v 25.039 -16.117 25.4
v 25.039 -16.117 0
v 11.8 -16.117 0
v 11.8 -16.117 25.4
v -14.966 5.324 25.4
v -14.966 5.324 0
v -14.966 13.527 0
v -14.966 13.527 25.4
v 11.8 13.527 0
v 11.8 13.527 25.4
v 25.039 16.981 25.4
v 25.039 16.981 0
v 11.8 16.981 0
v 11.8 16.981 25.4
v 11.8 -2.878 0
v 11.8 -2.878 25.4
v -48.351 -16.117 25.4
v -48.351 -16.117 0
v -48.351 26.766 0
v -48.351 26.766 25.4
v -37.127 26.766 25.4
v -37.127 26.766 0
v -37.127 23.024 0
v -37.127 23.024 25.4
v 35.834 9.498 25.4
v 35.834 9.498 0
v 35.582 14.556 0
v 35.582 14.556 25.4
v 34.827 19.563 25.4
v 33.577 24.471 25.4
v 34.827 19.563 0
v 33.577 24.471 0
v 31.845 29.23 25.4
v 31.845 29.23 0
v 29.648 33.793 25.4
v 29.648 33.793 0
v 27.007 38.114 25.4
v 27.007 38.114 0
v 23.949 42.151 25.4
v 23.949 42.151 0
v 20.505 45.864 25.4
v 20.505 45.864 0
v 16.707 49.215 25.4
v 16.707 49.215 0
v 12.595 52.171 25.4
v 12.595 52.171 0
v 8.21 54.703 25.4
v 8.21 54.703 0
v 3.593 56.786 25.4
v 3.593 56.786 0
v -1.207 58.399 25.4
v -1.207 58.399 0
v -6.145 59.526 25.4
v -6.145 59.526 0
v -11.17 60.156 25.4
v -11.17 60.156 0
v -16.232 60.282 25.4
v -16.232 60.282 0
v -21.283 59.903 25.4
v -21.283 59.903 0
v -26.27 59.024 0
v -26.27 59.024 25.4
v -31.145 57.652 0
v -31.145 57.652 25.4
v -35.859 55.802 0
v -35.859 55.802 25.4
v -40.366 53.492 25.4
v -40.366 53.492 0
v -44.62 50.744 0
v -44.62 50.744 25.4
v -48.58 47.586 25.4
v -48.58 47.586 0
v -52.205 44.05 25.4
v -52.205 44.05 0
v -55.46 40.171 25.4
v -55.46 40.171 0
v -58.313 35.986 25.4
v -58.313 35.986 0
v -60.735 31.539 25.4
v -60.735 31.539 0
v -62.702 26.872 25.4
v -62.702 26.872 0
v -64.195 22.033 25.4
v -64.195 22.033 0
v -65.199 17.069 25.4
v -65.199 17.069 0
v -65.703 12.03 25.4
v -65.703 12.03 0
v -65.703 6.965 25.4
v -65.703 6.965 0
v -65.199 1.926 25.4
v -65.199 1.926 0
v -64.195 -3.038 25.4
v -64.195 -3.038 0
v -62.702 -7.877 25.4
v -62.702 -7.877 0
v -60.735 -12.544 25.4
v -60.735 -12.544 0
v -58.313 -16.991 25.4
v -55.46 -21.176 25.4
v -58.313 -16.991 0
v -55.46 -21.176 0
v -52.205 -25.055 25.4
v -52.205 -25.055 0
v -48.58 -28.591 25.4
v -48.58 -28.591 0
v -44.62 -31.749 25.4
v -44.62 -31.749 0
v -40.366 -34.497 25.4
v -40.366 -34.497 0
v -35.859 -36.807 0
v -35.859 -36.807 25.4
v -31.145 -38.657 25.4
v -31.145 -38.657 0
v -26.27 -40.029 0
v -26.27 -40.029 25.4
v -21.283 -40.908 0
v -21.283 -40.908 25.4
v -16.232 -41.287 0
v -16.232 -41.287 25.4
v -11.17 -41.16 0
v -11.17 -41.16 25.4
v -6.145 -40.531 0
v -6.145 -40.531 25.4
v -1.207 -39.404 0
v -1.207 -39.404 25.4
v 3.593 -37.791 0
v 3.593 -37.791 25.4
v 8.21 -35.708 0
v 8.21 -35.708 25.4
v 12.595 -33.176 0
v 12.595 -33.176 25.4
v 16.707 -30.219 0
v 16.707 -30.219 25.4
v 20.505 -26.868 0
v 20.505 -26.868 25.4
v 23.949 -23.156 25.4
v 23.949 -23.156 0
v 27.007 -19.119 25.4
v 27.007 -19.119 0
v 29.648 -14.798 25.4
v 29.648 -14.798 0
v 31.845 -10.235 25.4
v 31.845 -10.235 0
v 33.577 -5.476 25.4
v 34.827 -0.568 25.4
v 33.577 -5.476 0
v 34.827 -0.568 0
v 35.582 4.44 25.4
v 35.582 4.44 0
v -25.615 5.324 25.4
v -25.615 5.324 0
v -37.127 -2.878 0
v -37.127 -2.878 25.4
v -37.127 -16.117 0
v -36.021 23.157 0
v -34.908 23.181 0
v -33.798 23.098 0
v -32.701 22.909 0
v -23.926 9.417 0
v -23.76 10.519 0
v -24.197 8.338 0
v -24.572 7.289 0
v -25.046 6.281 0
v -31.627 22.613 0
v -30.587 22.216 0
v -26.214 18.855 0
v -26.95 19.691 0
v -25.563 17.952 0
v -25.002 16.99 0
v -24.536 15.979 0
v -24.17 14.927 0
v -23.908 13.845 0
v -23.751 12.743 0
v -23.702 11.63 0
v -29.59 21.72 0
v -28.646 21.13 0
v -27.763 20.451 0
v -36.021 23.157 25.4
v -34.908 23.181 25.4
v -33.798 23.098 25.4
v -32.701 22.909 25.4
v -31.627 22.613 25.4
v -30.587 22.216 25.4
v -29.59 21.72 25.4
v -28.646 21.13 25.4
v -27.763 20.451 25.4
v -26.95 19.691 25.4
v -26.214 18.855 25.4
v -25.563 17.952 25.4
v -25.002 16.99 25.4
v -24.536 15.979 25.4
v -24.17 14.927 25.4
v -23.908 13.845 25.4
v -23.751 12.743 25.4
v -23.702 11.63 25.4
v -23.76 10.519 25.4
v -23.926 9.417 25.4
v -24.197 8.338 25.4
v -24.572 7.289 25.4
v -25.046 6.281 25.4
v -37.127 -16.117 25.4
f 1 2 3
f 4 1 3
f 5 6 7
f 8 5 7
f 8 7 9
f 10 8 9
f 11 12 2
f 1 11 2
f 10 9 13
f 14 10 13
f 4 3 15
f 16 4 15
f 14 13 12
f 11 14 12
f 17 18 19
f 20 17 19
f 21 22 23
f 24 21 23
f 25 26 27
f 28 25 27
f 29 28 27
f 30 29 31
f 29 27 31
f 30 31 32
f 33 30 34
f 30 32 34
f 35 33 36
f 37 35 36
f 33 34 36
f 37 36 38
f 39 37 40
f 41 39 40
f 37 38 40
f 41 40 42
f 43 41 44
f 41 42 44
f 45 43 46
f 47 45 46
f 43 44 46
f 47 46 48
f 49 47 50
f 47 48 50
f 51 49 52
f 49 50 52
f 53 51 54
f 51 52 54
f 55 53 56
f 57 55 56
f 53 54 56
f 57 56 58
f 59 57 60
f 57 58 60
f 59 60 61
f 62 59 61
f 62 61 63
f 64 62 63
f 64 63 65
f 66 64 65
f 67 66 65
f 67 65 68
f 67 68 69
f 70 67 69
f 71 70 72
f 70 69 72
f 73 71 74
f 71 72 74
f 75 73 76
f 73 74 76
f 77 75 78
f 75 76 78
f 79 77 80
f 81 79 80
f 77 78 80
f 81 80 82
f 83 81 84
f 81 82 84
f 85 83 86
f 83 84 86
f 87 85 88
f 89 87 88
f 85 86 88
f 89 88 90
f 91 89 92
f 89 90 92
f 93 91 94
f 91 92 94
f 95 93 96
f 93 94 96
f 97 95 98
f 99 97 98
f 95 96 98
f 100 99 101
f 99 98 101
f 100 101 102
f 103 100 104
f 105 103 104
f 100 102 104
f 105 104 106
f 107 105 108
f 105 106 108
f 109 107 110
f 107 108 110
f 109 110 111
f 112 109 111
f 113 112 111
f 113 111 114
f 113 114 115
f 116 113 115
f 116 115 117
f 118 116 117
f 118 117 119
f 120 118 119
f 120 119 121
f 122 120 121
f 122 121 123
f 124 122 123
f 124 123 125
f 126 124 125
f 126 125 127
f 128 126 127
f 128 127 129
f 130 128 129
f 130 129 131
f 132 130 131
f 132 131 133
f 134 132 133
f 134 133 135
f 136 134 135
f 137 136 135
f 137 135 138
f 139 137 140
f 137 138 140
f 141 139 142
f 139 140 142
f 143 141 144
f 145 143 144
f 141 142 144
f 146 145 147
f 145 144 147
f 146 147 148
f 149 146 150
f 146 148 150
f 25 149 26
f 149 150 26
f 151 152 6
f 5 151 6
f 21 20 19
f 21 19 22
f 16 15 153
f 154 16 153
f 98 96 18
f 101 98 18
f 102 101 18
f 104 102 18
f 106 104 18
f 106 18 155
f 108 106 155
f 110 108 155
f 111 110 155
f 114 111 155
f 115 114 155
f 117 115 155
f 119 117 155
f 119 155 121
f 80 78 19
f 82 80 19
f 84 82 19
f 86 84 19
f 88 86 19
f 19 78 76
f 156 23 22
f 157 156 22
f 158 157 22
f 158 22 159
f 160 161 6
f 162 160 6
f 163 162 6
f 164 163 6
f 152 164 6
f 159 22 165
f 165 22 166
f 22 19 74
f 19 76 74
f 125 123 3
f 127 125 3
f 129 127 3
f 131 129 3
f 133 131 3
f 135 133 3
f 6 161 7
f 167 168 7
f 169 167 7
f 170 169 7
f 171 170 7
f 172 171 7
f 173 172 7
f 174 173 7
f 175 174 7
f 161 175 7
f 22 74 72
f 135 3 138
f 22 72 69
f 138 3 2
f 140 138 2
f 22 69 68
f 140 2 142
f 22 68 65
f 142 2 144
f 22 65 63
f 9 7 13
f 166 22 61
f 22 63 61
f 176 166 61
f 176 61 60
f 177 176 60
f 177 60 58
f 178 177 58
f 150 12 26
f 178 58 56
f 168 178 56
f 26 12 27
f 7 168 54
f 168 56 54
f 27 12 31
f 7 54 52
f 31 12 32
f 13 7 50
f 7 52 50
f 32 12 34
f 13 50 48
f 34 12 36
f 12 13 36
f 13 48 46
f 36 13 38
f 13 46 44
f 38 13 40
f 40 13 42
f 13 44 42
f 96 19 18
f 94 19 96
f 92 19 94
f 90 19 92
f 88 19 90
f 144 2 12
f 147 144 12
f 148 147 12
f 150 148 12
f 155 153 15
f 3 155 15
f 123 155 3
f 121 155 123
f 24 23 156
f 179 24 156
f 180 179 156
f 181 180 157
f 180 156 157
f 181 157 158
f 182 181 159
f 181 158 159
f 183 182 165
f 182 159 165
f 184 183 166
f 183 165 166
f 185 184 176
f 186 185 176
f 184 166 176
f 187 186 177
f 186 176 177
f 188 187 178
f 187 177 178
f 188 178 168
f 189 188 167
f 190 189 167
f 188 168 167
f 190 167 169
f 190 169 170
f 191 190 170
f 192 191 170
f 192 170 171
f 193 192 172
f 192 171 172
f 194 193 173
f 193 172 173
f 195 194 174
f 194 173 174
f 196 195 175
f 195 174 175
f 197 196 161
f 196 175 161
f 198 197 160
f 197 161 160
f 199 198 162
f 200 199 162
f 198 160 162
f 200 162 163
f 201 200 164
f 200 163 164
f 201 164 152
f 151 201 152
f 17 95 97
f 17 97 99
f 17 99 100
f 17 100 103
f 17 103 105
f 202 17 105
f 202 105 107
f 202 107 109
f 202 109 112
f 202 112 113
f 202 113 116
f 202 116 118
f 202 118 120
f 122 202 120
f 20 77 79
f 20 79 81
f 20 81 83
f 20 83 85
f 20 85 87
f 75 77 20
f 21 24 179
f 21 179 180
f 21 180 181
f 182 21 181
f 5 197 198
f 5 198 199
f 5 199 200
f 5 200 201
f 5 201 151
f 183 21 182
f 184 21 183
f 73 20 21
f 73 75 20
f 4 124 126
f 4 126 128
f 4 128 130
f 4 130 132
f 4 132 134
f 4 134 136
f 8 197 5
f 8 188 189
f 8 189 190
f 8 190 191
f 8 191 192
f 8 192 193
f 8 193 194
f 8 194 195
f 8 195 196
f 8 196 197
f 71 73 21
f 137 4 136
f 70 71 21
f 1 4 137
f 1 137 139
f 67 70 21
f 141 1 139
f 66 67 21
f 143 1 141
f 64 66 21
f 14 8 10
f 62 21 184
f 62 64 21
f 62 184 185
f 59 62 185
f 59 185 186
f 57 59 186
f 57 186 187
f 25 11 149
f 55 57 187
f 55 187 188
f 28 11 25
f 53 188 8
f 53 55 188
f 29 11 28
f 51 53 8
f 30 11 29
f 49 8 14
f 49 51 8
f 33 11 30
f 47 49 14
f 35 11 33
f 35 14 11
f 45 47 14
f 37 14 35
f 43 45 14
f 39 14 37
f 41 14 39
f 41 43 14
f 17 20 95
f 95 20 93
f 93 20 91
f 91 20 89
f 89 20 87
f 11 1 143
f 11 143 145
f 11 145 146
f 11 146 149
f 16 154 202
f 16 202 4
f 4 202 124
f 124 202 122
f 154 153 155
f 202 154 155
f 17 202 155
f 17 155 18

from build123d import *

# Parameters (mm, degrees)
F0_R     = 50.8
F1_DEPTH = 25.4
F2_DEPTH = 25.4


with BuildPart() as f1:
    # F0 (on Top) → F1 (new body)
    with BuildSketch(Plane.XY):
        with Locations((-14.96590022, 9.497590363)):
            Circle(F0_R)
        with BuildLine():
            Line((-37.126943469, -16.1171220243), (-48.3513660729, -16.1171220243))
            Line((-48.3513660729, -16.1171220243), (-48.3513660729, 26.7659369856))
            Line((-48.3513660729, 26.7659369856), (-37.126943469, 26.7659369856))
            Line((-37.126943469, 26.7659369856), (-37.126943469, 23.0244621634))
            ThreePointArc((-37.126943469, 23.0244621634), (-25.562868863, 17.9519693026), (-25.6147123873, 5.3244074807))
            Line((-25.6147123873, 5.3244074807), (-14.96590022, 5.3244074807))
            Line((-14.96590022, 5.3244074807), (-14.96590022, 9.497590363))
            Line((-14.96590022, 9.497590363), (-14.96590022, 13.5268708691))
            Line((-14.96590022, 13.5268708691), (11.800034903, 13.5268708691))
            Line((11.800034903, 13.5268708691), (11.800034903, 16.9805400074))
            Line((11.800034903, 16.9805400074), (25.0390991569, 16.9805400074))
            Line((25.0390991569, 16.9805400074), (25.0390991569, -16.1171220243))
            Line((25.0390991569, -16.1171220243), (11.800034903, -16.1171220243))
            Line((11.800034903, -16.1171220243), (11.800034903, -2.8780577704))
            Line((11.800034903, -2.8780577704), (-37.126943469, -2.8780577704))
            Line((-37.126943469, -2.8780577704), (-37.126943469, -16.1171220243))
        make_face(mode=Mode.SUBTRACT)
    extrude(amount=F1_DEPTH)

    # F0 (on Top) → F2 (join)
    with BuildSketch(Plane.XY):
        with Locations((-14.96590022, 9.497590363)):
            Circle(F0_R)
        with BuildLine():
            Line((-37.126943469, -16.1171220243), (-48.3513660729, -16.1171220243))
            Line((-48.3513660729, -16.1171220243), (-48.3513660729, 26.7659369856))
            Line((-48.3513660729, 26.7659369856), (-37.126943469, 26.7659369856))
            Line((-37.126943469, 26.7659369856), (-37.126943469, 23.0244621634))
            ThreePointArc((-37.126943469, 23.0244621634), (-25.562868863, 17.9519693026), (-25.6147123873, 5.3244074807))
            Line((-25.6147123873, 5.3244074807), (-14.96590022, 5.3244074807))
            Line((-14.96590022, 5.3244074807), (-14.96590022, 9.497590363))
            Line((-14.96590022, 9.497590363), (-14.96590022, 13.5268708691))
            Line((-14.96590022, 13.5268708691), (11.800034903, 13.5268708691))
            Line((11.800034903, 13.5268708691), (11.800034903, 16.9805400074))
            Line((11.800034903, 16.9805400074), (25.0390991569, 16.9805400074))
            Line((25.0390991569, 16.9805400074), (25.0390991569, -16.1171220243))
            Line((25.0390991569, -16.1171220243), (11.800034903, -16.1171220243))
            Line((11.800034903, -16.1171220243), (11.800034903, -2.8780577704))
            Line((11.800034903, -2.8780577704), (-37.126943469, -2.8780577704))
            Line((-37.126943469, -2.8780577704), (-37.126943469, -16.1171220243))
        make_face(mode=Mode.SUBTRACT)
    extrude(amount=F2_DEPTH)


solid = f1.part
